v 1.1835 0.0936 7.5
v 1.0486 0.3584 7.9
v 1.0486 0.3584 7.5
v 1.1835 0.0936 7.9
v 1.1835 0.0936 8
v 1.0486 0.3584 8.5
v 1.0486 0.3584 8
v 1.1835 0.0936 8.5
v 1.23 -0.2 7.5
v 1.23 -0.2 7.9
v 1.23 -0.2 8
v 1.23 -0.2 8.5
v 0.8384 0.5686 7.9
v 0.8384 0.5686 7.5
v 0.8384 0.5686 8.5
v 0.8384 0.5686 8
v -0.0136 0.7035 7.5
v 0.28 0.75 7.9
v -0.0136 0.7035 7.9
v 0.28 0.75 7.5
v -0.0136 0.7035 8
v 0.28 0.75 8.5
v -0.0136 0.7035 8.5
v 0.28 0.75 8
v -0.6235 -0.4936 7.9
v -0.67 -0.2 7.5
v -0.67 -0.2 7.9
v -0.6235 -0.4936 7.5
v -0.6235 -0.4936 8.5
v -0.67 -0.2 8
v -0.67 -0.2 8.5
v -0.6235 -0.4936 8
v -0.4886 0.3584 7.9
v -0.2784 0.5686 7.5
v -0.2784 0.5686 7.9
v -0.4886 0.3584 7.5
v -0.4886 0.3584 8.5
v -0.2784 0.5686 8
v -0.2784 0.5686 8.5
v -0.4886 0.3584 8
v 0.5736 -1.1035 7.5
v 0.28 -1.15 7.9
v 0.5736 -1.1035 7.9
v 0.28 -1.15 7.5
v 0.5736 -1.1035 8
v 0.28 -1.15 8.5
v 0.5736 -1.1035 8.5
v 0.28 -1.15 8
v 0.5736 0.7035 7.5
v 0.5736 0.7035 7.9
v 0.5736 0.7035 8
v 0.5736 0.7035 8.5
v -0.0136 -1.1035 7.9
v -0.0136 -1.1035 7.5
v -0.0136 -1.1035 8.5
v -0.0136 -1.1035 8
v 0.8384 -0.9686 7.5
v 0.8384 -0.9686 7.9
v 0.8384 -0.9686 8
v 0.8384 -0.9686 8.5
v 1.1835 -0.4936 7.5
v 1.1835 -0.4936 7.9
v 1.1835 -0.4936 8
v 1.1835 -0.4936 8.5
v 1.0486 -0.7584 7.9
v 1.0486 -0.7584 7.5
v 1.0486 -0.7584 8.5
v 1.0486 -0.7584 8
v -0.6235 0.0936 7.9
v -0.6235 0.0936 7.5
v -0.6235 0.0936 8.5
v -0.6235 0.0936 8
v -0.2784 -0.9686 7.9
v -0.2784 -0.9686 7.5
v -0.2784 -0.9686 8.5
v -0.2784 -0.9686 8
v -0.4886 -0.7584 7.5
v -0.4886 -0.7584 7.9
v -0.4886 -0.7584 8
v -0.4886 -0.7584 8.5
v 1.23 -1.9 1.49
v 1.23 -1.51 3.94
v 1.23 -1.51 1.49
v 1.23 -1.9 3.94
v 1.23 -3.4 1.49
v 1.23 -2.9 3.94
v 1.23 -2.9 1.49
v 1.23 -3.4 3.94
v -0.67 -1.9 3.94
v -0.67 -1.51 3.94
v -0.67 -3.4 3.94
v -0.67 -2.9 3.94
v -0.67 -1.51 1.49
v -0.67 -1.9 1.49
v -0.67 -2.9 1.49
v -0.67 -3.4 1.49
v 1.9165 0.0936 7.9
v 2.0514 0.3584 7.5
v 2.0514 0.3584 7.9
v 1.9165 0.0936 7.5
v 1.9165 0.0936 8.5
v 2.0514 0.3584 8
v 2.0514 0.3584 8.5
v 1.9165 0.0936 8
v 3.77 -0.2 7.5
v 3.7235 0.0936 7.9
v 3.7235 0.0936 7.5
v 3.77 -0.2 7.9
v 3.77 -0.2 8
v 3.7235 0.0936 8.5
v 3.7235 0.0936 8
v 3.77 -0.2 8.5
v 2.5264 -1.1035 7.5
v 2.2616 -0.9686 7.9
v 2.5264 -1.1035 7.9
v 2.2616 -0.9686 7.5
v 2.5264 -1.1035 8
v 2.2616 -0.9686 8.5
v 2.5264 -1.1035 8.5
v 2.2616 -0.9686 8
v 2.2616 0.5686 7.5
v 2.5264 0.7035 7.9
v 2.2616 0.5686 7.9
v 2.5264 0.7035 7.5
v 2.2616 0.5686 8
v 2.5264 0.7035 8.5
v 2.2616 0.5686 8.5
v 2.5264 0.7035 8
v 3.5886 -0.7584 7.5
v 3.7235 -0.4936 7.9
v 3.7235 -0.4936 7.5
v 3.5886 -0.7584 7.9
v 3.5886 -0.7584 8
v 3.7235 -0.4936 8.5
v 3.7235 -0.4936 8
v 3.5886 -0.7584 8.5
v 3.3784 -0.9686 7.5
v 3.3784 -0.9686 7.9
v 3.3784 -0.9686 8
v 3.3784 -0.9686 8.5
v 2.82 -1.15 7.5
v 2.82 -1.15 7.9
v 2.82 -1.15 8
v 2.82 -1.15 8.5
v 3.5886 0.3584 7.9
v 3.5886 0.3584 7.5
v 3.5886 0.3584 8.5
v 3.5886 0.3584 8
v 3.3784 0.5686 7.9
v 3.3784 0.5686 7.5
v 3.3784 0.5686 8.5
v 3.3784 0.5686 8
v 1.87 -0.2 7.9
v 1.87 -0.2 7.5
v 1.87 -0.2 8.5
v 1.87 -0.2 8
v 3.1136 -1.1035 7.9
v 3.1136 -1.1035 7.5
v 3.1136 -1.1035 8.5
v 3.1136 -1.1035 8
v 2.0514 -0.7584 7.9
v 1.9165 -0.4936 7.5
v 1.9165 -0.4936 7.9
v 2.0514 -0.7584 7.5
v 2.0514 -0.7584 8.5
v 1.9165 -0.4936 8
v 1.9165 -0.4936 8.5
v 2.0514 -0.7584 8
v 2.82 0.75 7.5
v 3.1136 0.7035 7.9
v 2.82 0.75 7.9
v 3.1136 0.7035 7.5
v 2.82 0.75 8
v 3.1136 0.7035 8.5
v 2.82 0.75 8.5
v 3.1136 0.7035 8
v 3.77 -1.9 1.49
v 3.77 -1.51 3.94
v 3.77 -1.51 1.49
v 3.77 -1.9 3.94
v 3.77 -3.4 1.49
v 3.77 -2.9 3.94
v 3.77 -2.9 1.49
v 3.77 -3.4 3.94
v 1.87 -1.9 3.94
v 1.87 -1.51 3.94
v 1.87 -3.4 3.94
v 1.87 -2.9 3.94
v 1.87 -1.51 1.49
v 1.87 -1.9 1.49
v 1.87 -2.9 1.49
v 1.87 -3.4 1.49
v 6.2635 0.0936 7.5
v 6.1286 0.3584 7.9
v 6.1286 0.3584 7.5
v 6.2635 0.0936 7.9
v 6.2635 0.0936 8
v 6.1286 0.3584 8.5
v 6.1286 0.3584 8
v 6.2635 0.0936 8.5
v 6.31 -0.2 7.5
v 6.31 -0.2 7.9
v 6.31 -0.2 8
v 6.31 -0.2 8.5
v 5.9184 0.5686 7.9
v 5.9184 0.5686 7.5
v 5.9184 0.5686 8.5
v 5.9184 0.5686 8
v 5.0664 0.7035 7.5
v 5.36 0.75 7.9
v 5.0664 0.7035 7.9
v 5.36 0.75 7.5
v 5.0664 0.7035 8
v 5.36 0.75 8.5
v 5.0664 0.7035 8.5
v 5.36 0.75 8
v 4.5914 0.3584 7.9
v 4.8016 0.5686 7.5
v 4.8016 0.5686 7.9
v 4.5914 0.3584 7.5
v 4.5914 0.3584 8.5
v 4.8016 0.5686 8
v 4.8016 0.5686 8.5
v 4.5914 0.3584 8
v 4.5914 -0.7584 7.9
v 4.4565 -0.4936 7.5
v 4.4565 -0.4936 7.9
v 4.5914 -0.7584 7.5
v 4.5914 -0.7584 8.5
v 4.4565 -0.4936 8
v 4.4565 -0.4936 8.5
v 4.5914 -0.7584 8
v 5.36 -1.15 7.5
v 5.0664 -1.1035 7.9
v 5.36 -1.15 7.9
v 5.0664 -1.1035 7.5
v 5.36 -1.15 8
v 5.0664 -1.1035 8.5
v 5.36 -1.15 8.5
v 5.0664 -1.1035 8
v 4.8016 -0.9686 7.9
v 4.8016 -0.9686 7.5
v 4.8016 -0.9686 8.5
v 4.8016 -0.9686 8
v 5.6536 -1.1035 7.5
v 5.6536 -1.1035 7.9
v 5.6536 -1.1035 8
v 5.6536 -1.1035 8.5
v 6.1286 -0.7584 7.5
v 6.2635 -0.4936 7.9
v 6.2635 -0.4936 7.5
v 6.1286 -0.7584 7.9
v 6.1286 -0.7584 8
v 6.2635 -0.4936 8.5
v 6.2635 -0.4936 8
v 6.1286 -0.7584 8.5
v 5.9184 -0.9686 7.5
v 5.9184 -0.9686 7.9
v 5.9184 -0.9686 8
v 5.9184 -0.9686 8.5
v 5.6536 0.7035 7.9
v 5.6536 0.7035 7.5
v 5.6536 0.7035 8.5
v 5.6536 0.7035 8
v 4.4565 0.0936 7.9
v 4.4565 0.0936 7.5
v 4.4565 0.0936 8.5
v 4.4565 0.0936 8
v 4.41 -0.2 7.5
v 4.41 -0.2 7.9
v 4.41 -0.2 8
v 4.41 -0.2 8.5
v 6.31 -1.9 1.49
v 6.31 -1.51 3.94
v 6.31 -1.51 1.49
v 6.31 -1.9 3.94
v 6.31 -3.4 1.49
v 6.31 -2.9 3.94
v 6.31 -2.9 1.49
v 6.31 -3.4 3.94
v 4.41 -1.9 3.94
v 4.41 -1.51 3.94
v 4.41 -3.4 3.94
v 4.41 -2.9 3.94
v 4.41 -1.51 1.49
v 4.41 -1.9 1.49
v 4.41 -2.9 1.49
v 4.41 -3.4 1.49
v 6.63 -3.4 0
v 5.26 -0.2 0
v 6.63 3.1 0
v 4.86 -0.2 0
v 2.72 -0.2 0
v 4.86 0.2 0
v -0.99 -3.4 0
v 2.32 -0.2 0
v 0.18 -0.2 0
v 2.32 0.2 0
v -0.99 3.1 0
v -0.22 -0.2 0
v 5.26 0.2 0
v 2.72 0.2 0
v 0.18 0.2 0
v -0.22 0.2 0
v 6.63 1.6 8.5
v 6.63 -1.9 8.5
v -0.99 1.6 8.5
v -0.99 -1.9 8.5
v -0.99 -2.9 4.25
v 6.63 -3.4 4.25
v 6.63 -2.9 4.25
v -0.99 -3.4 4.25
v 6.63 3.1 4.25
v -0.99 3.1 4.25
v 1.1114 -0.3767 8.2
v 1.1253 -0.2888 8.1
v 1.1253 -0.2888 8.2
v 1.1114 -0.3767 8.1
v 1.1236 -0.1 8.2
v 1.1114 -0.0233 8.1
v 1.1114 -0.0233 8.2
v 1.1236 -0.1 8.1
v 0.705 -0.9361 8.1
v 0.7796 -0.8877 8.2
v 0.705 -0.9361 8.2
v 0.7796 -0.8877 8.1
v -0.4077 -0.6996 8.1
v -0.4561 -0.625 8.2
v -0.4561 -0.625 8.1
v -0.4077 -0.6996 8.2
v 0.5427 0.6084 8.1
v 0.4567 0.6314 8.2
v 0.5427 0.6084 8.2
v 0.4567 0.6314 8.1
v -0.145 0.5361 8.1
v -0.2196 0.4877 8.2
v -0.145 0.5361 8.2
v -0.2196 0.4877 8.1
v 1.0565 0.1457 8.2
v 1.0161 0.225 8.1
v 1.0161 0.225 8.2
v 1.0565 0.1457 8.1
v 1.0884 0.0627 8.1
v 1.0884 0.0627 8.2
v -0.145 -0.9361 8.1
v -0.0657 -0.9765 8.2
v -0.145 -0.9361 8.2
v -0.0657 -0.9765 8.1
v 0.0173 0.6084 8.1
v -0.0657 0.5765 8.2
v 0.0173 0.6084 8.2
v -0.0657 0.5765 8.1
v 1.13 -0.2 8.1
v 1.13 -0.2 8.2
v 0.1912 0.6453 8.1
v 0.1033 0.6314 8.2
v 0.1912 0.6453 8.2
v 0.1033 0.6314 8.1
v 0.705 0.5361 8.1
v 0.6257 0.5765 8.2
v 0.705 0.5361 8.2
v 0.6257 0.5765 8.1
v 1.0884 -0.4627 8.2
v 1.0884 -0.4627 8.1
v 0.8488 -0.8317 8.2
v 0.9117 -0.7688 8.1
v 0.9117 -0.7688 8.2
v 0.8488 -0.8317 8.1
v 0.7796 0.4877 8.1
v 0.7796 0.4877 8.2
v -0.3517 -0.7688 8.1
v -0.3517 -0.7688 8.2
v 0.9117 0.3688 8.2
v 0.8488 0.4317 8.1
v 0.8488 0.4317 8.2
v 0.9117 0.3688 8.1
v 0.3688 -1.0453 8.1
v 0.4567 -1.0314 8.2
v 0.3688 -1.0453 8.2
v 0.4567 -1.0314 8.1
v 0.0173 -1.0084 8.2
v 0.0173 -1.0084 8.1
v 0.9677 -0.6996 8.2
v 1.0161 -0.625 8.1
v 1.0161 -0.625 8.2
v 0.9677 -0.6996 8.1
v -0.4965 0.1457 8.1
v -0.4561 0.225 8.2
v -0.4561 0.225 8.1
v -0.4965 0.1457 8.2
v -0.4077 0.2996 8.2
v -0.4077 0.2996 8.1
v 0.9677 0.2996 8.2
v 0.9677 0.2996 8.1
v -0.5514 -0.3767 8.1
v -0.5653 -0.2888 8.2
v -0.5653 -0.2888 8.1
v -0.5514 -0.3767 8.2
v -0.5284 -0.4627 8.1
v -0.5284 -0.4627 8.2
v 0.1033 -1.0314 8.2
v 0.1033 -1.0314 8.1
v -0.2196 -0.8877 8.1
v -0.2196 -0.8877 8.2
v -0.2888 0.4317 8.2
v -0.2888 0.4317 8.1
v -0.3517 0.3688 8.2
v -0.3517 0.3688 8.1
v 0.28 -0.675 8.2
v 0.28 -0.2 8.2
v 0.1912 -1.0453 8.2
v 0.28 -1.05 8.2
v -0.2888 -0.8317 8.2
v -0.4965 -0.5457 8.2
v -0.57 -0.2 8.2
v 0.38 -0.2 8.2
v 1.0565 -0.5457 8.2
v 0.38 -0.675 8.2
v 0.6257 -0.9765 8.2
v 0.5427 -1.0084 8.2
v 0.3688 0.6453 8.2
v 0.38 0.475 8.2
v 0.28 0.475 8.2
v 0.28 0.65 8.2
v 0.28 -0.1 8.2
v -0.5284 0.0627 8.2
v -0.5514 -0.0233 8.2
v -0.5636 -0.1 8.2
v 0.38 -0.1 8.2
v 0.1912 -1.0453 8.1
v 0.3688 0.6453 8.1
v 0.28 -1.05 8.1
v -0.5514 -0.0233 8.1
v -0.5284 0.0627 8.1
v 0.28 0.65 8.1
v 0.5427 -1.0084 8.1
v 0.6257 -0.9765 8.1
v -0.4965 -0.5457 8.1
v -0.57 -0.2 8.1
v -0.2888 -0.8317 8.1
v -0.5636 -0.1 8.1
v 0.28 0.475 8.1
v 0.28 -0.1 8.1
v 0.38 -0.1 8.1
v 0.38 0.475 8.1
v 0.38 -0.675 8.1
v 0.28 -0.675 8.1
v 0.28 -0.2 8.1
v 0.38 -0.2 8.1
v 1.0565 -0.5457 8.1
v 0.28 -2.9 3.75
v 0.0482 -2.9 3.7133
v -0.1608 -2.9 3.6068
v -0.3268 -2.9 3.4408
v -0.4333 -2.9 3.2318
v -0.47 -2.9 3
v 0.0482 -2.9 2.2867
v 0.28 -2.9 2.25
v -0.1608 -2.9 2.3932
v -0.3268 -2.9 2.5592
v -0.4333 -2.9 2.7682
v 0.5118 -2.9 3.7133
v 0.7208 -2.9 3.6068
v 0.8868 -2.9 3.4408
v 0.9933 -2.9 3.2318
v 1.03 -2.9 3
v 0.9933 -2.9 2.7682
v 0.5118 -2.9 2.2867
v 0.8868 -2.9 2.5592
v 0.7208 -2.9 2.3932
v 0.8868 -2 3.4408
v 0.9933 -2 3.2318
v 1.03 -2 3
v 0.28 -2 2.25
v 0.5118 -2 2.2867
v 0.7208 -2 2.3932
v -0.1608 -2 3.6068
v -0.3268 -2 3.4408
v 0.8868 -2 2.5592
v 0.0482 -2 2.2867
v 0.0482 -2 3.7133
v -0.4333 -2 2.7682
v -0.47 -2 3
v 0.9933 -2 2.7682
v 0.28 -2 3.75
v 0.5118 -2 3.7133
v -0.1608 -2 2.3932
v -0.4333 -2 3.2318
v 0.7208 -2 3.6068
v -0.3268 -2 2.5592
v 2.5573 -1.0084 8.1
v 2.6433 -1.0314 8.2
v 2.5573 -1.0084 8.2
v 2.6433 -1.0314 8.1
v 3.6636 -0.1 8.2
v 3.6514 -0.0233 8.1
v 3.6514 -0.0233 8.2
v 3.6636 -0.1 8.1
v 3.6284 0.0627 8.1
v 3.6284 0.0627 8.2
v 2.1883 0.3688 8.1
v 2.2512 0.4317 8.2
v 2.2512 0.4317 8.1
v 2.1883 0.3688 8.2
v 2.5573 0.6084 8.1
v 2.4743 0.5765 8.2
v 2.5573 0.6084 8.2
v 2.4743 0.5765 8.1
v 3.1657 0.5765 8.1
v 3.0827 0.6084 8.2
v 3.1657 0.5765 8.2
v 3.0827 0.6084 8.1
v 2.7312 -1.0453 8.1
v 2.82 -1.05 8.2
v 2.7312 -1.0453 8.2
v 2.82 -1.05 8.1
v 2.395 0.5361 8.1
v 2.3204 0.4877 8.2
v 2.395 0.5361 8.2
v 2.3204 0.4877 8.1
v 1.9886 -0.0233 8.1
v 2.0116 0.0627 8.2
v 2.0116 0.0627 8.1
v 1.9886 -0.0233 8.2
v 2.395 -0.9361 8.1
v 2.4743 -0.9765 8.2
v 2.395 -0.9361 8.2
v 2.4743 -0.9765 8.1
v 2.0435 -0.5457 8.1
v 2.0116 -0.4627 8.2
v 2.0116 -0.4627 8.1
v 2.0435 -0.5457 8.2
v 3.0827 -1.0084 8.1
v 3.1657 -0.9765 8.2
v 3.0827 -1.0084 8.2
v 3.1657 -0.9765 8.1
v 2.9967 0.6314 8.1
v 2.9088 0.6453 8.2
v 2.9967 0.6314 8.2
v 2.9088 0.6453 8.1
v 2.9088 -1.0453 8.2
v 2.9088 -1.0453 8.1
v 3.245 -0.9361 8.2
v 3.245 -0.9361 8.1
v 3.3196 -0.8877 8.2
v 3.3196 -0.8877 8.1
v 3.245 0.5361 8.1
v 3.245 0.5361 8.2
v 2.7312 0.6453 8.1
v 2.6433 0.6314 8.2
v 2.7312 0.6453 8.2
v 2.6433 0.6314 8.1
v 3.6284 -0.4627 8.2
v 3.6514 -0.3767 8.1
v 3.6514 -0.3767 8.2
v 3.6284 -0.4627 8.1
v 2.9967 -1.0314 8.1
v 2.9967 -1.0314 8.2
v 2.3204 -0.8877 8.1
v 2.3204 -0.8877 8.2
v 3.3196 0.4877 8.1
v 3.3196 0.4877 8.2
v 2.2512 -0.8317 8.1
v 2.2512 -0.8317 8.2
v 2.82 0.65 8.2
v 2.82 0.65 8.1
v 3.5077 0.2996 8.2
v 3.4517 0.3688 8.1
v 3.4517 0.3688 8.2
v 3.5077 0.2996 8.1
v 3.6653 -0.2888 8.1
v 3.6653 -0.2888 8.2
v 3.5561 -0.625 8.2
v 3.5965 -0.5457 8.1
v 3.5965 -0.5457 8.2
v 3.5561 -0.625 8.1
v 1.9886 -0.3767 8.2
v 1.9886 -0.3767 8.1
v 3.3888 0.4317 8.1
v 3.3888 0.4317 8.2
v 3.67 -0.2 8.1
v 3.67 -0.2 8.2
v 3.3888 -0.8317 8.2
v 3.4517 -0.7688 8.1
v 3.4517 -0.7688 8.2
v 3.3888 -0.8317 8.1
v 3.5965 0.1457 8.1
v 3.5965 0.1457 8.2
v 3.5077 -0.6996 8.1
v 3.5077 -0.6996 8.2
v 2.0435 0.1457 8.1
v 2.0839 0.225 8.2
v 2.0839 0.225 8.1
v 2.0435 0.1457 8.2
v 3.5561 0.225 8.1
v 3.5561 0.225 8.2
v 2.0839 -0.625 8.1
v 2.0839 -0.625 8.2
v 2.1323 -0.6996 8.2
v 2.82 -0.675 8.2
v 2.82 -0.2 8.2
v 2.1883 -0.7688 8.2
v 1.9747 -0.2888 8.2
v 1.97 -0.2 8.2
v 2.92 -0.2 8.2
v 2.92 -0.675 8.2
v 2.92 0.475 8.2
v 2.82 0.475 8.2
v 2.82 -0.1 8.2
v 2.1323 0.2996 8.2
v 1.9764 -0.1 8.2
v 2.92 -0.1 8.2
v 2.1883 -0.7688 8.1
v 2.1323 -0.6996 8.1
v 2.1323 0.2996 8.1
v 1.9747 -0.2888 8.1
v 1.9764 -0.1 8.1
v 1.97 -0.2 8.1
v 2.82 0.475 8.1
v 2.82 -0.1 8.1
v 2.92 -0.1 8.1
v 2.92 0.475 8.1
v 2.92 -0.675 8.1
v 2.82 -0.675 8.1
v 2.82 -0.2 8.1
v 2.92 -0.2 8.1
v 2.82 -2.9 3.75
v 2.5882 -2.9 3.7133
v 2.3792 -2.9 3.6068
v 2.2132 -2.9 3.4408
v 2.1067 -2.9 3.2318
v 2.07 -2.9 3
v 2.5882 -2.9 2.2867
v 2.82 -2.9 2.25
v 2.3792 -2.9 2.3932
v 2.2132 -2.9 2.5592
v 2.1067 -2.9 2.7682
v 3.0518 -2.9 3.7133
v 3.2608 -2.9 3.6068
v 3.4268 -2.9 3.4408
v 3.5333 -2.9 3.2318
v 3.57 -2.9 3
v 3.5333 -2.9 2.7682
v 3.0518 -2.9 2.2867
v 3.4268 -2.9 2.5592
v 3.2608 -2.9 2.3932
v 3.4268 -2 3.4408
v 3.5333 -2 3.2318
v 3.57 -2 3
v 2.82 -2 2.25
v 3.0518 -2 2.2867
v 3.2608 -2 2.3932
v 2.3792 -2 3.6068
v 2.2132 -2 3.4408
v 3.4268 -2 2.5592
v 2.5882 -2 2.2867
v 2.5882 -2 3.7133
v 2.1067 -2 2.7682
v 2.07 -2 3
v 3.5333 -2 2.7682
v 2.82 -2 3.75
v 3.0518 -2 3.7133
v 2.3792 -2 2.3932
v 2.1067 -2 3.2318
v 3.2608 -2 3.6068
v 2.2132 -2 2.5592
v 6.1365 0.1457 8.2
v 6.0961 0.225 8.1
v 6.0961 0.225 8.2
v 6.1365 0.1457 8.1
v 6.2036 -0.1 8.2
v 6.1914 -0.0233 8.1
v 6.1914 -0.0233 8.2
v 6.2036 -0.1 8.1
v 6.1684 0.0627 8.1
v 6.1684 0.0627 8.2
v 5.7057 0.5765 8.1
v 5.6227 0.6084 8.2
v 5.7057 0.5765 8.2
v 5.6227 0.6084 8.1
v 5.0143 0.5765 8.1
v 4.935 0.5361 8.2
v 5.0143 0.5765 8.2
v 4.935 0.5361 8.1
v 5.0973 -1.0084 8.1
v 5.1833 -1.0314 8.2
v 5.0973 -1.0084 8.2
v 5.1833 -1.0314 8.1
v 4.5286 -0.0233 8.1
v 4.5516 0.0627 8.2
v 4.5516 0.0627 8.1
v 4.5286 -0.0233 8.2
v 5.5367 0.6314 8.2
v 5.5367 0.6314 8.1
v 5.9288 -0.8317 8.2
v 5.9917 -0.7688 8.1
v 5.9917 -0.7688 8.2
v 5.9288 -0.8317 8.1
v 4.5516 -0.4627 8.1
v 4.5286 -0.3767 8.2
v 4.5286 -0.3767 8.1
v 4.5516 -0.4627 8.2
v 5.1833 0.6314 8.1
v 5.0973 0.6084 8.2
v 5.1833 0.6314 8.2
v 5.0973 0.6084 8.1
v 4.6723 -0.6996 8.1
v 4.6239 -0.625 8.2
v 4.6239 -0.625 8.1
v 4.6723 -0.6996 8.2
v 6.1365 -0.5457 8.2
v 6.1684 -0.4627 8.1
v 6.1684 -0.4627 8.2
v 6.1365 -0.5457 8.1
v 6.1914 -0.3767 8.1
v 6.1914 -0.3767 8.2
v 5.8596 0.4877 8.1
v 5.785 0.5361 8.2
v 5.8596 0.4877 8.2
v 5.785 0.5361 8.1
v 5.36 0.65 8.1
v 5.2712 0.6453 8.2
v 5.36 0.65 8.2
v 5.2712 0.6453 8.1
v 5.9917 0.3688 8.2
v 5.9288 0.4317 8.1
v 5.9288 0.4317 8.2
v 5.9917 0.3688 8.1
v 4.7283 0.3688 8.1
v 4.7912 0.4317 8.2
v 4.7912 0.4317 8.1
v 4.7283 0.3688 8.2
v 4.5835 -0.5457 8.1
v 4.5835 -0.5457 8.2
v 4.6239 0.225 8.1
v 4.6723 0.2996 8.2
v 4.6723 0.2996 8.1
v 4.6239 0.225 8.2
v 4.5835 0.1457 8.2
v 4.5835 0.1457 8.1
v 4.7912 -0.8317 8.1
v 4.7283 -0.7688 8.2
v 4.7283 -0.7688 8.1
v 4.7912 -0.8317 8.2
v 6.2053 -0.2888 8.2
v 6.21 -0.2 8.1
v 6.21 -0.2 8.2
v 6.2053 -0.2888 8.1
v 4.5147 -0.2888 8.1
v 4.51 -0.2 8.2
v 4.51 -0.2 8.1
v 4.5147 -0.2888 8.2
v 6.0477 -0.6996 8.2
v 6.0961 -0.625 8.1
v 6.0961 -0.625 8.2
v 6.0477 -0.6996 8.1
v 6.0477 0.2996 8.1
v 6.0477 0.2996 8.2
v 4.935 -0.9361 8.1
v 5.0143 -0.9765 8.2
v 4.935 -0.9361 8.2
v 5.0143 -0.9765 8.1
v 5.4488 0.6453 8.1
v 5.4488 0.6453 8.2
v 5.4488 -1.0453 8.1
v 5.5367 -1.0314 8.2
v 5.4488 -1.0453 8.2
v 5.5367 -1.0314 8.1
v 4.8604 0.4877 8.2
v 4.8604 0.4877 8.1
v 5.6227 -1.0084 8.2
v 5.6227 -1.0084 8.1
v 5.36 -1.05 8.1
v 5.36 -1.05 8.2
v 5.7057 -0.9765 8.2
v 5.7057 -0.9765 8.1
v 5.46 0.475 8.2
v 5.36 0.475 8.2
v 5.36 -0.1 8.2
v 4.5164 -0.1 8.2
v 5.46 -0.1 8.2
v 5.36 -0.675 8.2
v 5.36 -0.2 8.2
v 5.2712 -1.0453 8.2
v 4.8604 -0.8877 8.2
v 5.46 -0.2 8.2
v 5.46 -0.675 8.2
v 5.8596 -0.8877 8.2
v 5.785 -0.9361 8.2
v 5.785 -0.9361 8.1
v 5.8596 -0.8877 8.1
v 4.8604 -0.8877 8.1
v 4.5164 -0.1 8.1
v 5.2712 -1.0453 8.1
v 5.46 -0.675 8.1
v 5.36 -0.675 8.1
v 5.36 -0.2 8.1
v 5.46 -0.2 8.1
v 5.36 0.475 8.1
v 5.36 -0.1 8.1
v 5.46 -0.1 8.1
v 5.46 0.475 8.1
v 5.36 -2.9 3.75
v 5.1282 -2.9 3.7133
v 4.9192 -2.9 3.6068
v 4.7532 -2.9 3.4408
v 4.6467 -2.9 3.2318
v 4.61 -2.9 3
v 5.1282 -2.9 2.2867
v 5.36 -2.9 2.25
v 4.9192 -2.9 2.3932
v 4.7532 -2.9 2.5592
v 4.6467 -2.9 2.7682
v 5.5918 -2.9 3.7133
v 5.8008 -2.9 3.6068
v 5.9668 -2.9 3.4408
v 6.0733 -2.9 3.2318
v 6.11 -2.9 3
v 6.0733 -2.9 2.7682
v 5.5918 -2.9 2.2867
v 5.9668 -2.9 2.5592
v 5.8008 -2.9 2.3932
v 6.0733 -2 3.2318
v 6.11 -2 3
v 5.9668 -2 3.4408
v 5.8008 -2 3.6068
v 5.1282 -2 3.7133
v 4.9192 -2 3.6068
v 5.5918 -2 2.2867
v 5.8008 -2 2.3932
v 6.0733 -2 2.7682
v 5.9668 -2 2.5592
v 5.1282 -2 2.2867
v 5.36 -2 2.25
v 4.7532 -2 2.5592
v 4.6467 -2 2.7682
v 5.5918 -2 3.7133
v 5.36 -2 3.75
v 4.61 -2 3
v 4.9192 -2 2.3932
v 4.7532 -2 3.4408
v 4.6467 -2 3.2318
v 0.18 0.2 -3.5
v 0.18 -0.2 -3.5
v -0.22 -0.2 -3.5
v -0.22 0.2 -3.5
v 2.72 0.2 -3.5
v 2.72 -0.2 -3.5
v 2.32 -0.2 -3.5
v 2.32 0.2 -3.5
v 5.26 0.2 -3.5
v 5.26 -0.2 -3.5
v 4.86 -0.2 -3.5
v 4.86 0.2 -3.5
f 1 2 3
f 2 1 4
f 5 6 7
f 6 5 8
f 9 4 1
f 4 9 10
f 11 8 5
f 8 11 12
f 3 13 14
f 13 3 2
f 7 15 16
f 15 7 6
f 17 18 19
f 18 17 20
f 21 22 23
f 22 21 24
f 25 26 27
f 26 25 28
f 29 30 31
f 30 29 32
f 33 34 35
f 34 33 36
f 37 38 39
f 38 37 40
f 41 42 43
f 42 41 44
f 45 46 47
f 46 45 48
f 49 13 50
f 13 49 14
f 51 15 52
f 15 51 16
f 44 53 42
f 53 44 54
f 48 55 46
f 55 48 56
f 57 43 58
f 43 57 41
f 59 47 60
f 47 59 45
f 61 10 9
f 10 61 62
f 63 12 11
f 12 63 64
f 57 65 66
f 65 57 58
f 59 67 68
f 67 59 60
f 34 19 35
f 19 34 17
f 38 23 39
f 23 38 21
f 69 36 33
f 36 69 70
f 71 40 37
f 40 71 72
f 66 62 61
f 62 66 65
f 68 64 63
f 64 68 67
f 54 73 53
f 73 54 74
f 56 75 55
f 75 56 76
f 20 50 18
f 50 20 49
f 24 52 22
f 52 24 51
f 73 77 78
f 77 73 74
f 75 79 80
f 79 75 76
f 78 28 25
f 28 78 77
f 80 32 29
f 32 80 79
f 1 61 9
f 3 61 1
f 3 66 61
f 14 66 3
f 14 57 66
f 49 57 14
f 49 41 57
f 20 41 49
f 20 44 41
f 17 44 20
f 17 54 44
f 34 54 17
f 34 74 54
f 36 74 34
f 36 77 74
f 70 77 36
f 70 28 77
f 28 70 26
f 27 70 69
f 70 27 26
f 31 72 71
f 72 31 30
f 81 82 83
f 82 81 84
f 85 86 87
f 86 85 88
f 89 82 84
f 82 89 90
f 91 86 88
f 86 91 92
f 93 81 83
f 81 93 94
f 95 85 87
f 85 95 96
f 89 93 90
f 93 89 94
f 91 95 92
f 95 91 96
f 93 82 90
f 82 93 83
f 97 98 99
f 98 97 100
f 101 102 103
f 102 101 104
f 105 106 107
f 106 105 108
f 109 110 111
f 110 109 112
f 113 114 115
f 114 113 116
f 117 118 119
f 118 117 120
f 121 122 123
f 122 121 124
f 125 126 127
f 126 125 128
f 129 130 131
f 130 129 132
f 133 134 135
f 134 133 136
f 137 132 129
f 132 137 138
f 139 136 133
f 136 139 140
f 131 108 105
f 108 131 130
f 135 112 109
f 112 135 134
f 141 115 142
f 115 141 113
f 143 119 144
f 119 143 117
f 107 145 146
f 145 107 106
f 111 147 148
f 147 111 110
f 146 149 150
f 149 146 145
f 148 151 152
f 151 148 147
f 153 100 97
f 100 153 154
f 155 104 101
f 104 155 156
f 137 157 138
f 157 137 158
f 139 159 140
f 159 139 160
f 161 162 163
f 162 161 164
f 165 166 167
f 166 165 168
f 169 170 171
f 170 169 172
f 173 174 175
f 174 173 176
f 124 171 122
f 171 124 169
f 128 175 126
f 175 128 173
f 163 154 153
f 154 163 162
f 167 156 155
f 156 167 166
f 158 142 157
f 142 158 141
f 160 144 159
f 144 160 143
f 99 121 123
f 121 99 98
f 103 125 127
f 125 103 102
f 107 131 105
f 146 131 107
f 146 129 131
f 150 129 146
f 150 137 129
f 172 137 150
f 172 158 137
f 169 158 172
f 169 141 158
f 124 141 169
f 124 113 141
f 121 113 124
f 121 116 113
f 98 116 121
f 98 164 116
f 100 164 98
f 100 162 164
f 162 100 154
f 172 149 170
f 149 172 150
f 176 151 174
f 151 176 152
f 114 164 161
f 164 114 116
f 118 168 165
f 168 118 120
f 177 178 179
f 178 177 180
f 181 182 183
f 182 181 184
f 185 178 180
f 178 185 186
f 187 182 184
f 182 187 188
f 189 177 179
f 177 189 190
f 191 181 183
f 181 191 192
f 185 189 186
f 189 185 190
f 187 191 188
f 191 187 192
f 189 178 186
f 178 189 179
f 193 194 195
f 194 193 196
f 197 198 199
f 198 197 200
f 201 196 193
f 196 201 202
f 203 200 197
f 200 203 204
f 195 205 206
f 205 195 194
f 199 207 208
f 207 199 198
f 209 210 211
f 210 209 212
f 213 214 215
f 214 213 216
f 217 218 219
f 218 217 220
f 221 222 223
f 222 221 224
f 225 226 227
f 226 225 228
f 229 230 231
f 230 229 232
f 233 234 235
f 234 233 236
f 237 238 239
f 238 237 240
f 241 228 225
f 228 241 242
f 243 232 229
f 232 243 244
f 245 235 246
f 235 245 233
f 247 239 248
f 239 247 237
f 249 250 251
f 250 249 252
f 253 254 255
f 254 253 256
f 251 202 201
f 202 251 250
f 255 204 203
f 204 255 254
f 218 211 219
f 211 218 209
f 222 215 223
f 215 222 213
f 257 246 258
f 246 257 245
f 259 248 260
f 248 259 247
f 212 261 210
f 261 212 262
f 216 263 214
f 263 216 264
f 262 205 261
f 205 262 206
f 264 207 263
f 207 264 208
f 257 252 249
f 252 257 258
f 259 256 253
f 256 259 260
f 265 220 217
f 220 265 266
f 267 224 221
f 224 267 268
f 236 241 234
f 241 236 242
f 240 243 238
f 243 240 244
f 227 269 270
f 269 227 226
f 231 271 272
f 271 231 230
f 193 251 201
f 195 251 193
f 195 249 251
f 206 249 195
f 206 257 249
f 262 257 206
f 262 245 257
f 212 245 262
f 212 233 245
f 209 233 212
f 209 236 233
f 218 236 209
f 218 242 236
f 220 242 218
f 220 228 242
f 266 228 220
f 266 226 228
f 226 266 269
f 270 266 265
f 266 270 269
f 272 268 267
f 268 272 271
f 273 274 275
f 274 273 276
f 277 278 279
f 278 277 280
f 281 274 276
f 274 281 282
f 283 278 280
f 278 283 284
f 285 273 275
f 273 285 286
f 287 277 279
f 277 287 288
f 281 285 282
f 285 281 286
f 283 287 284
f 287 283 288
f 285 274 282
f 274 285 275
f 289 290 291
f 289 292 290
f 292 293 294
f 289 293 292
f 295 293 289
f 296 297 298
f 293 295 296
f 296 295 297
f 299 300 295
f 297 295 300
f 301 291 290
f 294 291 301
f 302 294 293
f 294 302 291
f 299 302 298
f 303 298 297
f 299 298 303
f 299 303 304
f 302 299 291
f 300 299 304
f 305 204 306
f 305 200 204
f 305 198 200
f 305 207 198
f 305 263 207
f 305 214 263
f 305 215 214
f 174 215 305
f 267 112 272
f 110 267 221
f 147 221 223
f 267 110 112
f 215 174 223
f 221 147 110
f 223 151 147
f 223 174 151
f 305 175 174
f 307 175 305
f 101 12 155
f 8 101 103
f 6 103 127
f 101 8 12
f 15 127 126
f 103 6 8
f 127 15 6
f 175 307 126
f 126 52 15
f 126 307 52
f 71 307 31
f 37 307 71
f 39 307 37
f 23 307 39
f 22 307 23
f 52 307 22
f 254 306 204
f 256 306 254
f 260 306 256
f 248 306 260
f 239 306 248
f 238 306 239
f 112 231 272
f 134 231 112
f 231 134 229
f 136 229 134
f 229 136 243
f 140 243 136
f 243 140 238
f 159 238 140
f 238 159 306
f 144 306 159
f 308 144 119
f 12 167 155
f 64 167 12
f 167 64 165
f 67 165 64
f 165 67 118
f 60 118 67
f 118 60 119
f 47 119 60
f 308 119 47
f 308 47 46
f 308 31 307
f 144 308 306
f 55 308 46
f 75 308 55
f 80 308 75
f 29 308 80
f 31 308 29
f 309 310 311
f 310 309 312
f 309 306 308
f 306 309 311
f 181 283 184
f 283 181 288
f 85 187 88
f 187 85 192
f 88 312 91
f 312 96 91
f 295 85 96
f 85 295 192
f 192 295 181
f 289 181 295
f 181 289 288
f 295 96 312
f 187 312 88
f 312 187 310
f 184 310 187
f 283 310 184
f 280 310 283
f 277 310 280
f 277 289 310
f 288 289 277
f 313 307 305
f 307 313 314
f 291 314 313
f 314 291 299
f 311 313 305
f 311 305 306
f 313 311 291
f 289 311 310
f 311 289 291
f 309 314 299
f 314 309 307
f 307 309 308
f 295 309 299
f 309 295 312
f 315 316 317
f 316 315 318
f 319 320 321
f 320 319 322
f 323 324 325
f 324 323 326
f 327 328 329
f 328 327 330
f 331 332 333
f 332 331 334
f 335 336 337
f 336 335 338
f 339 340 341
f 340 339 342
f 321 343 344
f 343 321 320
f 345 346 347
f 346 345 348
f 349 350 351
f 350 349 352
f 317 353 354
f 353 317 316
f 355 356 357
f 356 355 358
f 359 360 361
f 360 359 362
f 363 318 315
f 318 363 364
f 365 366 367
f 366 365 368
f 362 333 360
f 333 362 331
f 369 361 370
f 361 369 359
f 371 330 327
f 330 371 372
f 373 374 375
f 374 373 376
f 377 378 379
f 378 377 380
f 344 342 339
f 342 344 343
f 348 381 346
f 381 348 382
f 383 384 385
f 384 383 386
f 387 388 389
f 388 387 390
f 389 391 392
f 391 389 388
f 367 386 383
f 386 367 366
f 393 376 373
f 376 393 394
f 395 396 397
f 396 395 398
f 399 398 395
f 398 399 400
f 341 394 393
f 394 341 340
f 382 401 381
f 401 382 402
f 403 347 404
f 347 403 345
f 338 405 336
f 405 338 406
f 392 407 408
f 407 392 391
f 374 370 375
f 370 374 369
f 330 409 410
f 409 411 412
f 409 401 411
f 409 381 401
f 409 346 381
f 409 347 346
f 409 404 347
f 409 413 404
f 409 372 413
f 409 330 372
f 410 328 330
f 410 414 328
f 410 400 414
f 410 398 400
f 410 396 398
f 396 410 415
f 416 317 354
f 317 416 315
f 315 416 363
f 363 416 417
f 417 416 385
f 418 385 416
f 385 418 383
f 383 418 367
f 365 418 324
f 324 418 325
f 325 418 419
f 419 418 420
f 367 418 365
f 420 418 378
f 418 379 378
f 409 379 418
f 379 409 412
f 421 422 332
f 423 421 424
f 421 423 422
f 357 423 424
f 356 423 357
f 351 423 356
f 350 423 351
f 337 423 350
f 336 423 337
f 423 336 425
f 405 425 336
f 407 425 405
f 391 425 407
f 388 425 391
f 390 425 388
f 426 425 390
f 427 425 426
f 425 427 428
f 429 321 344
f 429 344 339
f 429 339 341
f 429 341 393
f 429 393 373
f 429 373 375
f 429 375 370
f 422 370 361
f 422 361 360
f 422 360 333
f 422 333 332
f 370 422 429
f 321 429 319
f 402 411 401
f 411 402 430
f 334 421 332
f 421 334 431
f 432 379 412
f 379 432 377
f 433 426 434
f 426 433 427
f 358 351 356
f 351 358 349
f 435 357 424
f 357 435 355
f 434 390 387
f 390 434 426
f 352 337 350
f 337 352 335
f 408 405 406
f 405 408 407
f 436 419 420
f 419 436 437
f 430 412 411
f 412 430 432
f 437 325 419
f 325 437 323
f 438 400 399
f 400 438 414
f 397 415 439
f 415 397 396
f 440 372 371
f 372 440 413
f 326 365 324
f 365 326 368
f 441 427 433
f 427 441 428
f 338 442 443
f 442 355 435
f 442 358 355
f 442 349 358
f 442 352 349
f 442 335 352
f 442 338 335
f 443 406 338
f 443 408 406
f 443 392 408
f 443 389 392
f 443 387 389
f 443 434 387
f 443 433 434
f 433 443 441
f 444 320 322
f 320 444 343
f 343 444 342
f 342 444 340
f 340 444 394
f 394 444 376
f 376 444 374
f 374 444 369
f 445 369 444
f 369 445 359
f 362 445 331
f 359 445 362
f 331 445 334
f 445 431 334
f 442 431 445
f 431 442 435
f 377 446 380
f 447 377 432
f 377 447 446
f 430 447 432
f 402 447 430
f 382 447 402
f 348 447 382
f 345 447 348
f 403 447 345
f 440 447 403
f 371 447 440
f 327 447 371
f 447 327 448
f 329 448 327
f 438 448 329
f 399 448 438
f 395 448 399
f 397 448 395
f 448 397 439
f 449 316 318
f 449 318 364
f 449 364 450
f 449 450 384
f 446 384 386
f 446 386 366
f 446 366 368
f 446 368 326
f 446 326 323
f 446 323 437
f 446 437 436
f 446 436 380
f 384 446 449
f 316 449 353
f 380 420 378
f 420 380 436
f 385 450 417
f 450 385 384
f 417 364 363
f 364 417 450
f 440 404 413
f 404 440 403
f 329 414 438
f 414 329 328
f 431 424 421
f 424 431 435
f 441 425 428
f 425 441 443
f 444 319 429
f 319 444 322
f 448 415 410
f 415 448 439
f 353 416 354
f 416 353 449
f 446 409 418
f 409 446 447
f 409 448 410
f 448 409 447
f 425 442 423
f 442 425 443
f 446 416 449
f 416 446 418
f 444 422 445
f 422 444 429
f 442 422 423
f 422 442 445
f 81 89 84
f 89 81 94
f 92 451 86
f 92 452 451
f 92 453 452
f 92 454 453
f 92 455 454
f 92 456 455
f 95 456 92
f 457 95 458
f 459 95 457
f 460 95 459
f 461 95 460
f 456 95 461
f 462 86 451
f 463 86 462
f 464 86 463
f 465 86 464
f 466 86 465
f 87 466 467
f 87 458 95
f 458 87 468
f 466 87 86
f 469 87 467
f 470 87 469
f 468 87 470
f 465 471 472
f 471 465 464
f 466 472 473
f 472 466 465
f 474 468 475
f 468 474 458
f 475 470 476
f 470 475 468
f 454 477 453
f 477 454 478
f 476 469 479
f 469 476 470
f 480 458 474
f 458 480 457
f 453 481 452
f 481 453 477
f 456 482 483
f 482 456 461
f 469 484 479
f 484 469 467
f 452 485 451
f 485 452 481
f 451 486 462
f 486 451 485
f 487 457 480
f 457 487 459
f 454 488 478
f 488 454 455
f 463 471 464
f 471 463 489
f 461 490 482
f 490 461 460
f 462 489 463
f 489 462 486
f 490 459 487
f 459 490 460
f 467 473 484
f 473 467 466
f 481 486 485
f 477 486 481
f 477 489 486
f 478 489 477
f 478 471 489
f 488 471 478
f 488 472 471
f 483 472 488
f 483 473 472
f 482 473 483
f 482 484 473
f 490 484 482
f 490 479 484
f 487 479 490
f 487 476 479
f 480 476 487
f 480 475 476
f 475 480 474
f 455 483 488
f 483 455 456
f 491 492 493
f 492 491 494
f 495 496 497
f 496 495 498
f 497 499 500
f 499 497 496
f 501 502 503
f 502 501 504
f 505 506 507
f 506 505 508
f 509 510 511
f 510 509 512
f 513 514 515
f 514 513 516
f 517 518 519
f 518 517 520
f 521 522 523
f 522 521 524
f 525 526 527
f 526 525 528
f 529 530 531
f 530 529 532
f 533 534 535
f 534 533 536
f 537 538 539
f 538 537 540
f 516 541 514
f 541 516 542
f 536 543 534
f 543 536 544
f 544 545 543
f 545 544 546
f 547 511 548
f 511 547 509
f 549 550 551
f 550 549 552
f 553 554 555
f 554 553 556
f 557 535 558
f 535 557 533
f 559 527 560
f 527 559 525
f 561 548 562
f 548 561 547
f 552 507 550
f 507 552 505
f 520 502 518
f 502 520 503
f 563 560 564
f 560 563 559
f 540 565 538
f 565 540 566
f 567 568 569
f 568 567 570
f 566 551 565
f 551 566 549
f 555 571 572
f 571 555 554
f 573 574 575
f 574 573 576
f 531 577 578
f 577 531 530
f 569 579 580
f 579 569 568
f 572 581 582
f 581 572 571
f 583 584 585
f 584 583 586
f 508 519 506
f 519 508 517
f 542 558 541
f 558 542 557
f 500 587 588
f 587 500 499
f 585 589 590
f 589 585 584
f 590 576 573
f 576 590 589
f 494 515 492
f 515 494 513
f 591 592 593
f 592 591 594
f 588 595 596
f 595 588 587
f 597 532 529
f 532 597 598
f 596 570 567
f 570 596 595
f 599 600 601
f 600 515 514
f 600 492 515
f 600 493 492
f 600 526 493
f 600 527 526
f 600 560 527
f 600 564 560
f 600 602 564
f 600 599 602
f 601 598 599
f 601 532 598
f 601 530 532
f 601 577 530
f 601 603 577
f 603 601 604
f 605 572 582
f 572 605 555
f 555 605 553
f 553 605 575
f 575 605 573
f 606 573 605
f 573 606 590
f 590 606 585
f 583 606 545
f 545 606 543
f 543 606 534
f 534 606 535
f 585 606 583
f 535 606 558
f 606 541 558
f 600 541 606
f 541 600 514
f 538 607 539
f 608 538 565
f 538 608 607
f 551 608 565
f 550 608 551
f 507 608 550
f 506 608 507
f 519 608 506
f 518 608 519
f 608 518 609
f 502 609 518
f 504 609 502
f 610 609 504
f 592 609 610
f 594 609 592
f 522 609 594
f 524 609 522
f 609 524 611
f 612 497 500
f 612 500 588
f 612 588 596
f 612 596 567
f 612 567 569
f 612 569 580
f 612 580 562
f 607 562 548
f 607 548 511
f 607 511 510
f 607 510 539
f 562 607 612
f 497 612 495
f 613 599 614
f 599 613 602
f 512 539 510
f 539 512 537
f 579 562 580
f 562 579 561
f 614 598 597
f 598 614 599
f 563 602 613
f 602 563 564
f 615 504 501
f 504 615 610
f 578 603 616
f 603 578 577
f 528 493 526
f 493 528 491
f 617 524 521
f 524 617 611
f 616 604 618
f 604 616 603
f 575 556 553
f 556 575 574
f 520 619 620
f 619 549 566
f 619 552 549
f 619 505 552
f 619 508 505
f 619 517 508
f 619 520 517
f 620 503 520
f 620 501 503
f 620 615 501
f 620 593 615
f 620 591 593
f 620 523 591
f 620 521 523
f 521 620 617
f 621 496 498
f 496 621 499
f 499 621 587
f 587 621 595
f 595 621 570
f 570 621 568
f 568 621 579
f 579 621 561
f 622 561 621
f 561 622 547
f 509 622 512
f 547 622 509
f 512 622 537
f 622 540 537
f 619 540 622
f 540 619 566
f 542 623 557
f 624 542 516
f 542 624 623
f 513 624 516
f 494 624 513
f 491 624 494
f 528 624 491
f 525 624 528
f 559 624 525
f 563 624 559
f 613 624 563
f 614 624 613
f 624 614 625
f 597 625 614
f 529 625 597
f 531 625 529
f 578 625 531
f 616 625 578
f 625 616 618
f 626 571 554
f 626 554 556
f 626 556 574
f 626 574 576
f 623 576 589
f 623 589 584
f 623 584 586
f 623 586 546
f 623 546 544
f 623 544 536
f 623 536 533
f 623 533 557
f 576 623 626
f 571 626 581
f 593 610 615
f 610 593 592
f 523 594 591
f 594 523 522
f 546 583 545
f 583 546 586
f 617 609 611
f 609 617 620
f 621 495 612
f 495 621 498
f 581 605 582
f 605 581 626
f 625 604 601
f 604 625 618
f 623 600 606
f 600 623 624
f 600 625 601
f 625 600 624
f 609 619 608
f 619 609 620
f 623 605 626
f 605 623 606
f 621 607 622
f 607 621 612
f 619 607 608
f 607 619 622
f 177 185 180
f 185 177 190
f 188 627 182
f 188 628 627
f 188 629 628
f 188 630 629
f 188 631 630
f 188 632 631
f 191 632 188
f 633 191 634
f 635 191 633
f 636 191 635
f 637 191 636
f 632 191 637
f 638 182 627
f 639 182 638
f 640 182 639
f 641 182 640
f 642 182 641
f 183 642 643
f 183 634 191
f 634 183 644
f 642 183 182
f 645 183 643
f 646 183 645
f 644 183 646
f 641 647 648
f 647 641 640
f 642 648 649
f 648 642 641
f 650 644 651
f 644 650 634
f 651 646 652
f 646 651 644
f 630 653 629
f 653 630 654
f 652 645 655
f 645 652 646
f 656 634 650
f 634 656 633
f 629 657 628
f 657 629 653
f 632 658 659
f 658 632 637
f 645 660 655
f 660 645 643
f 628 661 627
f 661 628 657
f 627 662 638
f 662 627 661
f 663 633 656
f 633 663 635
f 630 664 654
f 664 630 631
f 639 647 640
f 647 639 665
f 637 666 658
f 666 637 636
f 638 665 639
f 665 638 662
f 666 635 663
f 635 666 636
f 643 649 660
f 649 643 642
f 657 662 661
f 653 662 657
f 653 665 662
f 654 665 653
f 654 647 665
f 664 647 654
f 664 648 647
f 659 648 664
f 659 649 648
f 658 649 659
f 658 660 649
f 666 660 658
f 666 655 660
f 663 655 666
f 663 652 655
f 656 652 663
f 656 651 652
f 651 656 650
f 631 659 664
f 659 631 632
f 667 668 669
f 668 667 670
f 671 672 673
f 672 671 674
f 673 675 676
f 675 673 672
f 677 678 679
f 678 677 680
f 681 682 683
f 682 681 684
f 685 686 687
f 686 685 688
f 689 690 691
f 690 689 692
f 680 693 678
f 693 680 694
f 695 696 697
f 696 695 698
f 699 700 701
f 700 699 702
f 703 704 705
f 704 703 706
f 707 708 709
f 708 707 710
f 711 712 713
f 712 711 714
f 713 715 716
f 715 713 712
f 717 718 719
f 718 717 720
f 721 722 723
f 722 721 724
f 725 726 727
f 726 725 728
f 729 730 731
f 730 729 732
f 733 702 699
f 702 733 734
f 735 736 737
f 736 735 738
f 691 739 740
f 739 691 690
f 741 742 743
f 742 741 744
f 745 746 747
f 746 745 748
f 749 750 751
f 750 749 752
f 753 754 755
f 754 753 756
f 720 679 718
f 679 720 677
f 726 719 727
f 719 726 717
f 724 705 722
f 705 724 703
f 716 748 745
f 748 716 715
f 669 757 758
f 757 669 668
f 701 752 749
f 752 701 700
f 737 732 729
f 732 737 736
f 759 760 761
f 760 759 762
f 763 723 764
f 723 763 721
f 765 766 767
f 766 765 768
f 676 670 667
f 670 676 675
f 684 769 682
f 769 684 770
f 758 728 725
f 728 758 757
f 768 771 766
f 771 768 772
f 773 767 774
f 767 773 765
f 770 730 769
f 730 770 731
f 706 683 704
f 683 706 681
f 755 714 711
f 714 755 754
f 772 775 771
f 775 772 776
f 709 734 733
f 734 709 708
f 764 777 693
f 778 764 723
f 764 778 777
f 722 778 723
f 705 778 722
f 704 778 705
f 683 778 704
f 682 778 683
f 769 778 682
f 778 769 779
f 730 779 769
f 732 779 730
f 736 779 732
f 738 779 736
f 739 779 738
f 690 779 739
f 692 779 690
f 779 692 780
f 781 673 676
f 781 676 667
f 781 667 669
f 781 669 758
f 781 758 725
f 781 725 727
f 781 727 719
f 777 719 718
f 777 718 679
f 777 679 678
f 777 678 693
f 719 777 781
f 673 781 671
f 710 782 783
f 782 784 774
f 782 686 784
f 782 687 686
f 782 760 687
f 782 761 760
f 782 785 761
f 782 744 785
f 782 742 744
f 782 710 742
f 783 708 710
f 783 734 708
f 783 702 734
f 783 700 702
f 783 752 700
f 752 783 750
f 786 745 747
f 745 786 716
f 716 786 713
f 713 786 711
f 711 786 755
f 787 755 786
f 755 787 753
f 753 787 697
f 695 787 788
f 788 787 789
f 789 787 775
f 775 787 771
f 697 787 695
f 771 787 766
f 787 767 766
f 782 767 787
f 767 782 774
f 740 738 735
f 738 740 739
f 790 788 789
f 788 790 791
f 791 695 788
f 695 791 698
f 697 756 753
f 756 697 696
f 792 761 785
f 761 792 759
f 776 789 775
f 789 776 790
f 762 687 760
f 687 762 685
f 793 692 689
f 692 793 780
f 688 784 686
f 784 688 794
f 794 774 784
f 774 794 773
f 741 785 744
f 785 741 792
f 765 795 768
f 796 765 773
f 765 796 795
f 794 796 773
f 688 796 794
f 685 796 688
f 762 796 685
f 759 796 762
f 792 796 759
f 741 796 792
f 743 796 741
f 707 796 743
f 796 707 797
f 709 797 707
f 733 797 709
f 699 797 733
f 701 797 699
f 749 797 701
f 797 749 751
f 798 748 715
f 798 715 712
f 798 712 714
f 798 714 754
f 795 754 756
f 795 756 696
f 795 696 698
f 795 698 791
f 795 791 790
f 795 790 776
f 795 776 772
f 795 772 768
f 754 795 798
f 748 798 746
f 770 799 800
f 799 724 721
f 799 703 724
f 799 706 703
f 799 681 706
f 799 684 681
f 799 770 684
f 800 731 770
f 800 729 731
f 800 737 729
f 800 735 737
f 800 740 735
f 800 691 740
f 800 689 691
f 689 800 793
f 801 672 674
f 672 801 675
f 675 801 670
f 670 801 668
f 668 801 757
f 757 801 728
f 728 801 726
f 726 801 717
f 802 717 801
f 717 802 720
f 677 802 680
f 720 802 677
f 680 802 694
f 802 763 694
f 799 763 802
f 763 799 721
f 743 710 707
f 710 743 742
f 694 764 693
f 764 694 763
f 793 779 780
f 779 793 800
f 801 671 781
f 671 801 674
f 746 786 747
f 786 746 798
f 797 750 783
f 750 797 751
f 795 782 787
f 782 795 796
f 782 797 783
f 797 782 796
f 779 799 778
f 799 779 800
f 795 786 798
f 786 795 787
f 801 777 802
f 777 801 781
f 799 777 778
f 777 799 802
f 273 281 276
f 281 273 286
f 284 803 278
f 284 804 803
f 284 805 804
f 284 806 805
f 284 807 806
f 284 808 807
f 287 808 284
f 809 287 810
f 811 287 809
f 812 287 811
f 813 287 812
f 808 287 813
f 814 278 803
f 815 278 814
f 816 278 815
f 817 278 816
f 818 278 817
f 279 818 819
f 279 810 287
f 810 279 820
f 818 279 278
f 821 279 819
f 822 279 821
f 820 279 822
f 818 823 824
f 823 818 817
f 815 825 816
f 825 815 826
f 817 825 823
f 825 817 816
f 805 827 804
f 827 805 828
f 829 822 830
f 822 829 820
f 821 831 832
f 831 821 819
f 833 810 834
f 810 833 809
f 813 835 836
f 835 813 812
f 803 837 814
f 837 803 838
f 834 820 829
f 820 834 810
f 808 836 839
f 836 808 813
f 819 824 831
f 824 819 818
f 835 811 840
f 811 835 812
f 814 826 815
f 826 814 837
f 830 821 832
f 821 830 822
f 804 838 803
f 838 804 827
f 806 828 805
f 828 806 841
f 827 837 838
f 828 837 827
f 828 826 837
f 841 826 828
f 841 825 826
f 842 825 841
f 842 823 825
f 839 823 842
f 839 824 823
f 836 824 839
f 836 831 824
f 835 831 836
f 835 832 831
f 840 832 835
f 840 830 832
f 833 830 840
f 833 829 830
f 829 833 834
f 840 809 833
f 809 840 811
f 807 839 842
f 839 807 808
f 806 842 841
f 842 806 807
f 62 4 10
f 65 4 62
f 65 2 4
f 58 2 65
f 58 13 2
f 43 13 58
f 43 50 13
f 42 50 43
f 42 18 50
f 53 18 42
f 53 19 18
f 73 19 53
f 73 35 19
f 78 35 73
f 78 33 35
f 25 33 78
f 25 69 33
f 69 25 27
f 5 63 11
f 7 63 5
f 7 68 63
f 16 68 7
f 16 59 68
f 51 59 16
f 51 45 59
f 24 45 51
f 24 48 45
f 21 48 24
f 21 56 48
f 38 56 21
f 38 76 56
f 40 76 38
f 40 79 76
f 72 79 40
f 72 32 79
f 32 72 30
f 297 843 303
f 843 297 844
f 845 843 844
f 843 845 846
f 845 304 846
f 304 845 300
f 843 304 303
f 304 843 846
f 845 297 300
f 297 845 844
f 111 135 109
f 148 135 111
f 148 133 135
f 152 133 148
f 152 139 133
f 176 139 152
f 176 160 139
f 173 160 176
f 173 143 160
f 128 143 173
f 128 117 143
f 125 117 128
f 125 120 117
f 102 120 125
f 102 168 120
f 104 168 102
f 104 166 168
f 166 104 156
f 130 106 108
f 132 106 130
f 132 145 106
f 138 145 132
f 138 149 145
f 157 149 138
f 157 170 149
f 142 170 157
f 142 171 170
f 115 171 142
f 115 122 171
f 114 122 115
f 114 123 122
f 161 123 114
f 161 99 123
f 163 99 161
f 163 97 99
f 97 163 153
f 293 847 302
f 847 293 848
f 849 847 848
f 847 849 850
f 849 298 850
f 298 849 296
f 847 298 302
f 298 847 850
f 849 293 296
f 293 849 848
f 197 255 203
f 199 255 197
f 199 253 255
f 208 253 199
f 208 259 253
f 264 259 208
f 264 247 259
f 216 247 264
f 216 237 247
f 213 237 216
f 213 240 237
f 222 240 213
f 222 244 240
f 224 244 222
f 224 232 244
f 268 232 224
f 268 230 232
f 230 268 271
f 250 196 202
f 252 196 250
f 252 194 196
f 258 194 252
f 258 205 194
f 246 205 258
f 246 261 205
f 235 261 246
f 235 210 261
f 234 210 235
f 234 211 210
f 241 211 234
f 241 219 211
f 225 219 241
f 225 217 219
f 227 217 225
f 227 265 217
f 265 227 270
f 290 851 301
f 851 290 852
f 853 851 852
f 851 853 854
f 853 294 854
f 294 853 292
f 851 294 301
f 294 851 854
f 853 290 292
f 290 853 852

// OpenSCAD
// Generates a terminal block parametrically
// https://www.digikey.ca/en/products/detail/on-shore-technology-inc/OSTVN05A150/1588865?s=N4IgjCBcpgDA7AViqAxlAZgQwDYGcBTAGhAHsoBtEAJmoE5ZYIBdEgBwBcoQBlDgJwCWAOwDmIAL4kAtABYUIdJGz5iZSiABs2gBwhWITt0kSJQA

np=3; // number of terminals
dp=2.54; // spacing between pins
sd=1.9; // screw diameter
wd=1.5; // wire hole diameter
pkgDepth=6.5;
pkgHeight=8.5;
pinDepth=3.2;
pinLength=3.5;
pinSize=0.4;
pkgColor="#76AE8D";

module body() {
    difference() {
        color(pkgColor)
        polyhedron( 
        points = [
        // bottom plane
        [ 0,         0,          0 ], // 0
        [ 0,         pkgDepth,   0 ], // 1
        [ np*dp,     pkgDepth,   0 ], // 2
        [ np*dp,     0,          0 ], // 3

        // top plane
        [ 0,         pkgDepth-1.5,   pkgHeight ], // 4
        [ np*dp,     pkgDepth-1.5,   pkgHeight ], // 5
        [ np*dp,     1.5,   pkgHeight ], // 6
        [ 0,         1.5,   pkgHeight ], // 7

        // the mid kneel point (front)
        [ 0,         0,   pkgHeight/2 ], // 8
        [ 0,         0.5, pkgHeight/2 ], // 9
        [ np*dp,     0.5, pkgHeight/2 ], // 10
        [ np*dp,     0,   pkgHeight/2 ], // 11
            
        // the mid kneel point (back)
        [ 0,         pkgDepth, pkgHeight/2 ], // 12
        [ np*dp,     pkgDepth, pkgHeight/2 ], // 13
        ],
        faces = [
        [0, 3, 2, 1 ], // bottom face
        [4, 5, 6, 7 ], // top face
        [8, 9, 10,11], // mid kneel point
        [9, 7, 6, 10], // front angle part
        [0, 8, 11,3 ], // front vertical
        [4, 12, 13, 5 ], // back vertical
        [12, 1, 2, 13 ], // back vertical
        [6, 5, 13, 2, 3, 11, 10 ], // right side
        [4, 7, 9, 8, 0,  1, 12  ] // left side
        ]);

      // the holes for the screws and the front screw terminal places
      for (a =[1:np]) {
        c = (a == 1) ? dp/2 : (a-1)*dp + dp/2;
        translate([c, pinDepth, pkgHeight-1]) color(pkgColor) cylinder( h=2, r=(sd/2), $fn=20);
        
        translate([c-(sd/2), -0.01, 1.49]) color(pkgColor) cube([ sd, sd, pkgHeight/2-1.8 ]);  
      } // for
    }
}

module pins() {
    for (a =[1:np]) {
        c = (a == 1) ? dp/2 : (a-1)*dp + dp/2;

        // the screws on the top
        translate([c, pinDepth, pkgHeight-0.6]) color("#C0C0C0") cylinder( h=0.1, r=(sd/2), $fn=60);
        difference() {
        translate([c, pinDepth, pkgHeight-0.4]) color("#C0C0C0") cylinder( h=0.1, r=sd/2-0.1, $fn=60);
        translate([c-(sd/2), pinDepth, pkgHeight-0.7]) color("#C0C0C0") cube([sd, 0.1, 0.5]);
            
        translate([c+0.1, pinDepth-sd/4, pkgHeight-0.7])rotate([0, 0, 90])
            color("#C0C0C0") cube([sd/2+.2, 0.1, 0.5]); 
        }
        
        // the metal front pieces
        difference() {
        translate([c-(sd/2), 0.5, 0.99]) color("#C0C0C0") cube([ sd, 1, pkgHeight/2-1 ]);
        translate([c, 1.4, 3]) rotate([90,0,0]) color("#C0C0C0") cylinder(r=wd/2, h=1.3, $fn=20);
        }
        translate([c-0.5,pinDepth,-pinLength])color("#C0C0C0")cube([pinSize,pinSize, pinLength]);
    } // for
}

translate([-dp/2+0.28,-pinDepth-pinSize/2,0])
union() {
    body();
    pins();
}
